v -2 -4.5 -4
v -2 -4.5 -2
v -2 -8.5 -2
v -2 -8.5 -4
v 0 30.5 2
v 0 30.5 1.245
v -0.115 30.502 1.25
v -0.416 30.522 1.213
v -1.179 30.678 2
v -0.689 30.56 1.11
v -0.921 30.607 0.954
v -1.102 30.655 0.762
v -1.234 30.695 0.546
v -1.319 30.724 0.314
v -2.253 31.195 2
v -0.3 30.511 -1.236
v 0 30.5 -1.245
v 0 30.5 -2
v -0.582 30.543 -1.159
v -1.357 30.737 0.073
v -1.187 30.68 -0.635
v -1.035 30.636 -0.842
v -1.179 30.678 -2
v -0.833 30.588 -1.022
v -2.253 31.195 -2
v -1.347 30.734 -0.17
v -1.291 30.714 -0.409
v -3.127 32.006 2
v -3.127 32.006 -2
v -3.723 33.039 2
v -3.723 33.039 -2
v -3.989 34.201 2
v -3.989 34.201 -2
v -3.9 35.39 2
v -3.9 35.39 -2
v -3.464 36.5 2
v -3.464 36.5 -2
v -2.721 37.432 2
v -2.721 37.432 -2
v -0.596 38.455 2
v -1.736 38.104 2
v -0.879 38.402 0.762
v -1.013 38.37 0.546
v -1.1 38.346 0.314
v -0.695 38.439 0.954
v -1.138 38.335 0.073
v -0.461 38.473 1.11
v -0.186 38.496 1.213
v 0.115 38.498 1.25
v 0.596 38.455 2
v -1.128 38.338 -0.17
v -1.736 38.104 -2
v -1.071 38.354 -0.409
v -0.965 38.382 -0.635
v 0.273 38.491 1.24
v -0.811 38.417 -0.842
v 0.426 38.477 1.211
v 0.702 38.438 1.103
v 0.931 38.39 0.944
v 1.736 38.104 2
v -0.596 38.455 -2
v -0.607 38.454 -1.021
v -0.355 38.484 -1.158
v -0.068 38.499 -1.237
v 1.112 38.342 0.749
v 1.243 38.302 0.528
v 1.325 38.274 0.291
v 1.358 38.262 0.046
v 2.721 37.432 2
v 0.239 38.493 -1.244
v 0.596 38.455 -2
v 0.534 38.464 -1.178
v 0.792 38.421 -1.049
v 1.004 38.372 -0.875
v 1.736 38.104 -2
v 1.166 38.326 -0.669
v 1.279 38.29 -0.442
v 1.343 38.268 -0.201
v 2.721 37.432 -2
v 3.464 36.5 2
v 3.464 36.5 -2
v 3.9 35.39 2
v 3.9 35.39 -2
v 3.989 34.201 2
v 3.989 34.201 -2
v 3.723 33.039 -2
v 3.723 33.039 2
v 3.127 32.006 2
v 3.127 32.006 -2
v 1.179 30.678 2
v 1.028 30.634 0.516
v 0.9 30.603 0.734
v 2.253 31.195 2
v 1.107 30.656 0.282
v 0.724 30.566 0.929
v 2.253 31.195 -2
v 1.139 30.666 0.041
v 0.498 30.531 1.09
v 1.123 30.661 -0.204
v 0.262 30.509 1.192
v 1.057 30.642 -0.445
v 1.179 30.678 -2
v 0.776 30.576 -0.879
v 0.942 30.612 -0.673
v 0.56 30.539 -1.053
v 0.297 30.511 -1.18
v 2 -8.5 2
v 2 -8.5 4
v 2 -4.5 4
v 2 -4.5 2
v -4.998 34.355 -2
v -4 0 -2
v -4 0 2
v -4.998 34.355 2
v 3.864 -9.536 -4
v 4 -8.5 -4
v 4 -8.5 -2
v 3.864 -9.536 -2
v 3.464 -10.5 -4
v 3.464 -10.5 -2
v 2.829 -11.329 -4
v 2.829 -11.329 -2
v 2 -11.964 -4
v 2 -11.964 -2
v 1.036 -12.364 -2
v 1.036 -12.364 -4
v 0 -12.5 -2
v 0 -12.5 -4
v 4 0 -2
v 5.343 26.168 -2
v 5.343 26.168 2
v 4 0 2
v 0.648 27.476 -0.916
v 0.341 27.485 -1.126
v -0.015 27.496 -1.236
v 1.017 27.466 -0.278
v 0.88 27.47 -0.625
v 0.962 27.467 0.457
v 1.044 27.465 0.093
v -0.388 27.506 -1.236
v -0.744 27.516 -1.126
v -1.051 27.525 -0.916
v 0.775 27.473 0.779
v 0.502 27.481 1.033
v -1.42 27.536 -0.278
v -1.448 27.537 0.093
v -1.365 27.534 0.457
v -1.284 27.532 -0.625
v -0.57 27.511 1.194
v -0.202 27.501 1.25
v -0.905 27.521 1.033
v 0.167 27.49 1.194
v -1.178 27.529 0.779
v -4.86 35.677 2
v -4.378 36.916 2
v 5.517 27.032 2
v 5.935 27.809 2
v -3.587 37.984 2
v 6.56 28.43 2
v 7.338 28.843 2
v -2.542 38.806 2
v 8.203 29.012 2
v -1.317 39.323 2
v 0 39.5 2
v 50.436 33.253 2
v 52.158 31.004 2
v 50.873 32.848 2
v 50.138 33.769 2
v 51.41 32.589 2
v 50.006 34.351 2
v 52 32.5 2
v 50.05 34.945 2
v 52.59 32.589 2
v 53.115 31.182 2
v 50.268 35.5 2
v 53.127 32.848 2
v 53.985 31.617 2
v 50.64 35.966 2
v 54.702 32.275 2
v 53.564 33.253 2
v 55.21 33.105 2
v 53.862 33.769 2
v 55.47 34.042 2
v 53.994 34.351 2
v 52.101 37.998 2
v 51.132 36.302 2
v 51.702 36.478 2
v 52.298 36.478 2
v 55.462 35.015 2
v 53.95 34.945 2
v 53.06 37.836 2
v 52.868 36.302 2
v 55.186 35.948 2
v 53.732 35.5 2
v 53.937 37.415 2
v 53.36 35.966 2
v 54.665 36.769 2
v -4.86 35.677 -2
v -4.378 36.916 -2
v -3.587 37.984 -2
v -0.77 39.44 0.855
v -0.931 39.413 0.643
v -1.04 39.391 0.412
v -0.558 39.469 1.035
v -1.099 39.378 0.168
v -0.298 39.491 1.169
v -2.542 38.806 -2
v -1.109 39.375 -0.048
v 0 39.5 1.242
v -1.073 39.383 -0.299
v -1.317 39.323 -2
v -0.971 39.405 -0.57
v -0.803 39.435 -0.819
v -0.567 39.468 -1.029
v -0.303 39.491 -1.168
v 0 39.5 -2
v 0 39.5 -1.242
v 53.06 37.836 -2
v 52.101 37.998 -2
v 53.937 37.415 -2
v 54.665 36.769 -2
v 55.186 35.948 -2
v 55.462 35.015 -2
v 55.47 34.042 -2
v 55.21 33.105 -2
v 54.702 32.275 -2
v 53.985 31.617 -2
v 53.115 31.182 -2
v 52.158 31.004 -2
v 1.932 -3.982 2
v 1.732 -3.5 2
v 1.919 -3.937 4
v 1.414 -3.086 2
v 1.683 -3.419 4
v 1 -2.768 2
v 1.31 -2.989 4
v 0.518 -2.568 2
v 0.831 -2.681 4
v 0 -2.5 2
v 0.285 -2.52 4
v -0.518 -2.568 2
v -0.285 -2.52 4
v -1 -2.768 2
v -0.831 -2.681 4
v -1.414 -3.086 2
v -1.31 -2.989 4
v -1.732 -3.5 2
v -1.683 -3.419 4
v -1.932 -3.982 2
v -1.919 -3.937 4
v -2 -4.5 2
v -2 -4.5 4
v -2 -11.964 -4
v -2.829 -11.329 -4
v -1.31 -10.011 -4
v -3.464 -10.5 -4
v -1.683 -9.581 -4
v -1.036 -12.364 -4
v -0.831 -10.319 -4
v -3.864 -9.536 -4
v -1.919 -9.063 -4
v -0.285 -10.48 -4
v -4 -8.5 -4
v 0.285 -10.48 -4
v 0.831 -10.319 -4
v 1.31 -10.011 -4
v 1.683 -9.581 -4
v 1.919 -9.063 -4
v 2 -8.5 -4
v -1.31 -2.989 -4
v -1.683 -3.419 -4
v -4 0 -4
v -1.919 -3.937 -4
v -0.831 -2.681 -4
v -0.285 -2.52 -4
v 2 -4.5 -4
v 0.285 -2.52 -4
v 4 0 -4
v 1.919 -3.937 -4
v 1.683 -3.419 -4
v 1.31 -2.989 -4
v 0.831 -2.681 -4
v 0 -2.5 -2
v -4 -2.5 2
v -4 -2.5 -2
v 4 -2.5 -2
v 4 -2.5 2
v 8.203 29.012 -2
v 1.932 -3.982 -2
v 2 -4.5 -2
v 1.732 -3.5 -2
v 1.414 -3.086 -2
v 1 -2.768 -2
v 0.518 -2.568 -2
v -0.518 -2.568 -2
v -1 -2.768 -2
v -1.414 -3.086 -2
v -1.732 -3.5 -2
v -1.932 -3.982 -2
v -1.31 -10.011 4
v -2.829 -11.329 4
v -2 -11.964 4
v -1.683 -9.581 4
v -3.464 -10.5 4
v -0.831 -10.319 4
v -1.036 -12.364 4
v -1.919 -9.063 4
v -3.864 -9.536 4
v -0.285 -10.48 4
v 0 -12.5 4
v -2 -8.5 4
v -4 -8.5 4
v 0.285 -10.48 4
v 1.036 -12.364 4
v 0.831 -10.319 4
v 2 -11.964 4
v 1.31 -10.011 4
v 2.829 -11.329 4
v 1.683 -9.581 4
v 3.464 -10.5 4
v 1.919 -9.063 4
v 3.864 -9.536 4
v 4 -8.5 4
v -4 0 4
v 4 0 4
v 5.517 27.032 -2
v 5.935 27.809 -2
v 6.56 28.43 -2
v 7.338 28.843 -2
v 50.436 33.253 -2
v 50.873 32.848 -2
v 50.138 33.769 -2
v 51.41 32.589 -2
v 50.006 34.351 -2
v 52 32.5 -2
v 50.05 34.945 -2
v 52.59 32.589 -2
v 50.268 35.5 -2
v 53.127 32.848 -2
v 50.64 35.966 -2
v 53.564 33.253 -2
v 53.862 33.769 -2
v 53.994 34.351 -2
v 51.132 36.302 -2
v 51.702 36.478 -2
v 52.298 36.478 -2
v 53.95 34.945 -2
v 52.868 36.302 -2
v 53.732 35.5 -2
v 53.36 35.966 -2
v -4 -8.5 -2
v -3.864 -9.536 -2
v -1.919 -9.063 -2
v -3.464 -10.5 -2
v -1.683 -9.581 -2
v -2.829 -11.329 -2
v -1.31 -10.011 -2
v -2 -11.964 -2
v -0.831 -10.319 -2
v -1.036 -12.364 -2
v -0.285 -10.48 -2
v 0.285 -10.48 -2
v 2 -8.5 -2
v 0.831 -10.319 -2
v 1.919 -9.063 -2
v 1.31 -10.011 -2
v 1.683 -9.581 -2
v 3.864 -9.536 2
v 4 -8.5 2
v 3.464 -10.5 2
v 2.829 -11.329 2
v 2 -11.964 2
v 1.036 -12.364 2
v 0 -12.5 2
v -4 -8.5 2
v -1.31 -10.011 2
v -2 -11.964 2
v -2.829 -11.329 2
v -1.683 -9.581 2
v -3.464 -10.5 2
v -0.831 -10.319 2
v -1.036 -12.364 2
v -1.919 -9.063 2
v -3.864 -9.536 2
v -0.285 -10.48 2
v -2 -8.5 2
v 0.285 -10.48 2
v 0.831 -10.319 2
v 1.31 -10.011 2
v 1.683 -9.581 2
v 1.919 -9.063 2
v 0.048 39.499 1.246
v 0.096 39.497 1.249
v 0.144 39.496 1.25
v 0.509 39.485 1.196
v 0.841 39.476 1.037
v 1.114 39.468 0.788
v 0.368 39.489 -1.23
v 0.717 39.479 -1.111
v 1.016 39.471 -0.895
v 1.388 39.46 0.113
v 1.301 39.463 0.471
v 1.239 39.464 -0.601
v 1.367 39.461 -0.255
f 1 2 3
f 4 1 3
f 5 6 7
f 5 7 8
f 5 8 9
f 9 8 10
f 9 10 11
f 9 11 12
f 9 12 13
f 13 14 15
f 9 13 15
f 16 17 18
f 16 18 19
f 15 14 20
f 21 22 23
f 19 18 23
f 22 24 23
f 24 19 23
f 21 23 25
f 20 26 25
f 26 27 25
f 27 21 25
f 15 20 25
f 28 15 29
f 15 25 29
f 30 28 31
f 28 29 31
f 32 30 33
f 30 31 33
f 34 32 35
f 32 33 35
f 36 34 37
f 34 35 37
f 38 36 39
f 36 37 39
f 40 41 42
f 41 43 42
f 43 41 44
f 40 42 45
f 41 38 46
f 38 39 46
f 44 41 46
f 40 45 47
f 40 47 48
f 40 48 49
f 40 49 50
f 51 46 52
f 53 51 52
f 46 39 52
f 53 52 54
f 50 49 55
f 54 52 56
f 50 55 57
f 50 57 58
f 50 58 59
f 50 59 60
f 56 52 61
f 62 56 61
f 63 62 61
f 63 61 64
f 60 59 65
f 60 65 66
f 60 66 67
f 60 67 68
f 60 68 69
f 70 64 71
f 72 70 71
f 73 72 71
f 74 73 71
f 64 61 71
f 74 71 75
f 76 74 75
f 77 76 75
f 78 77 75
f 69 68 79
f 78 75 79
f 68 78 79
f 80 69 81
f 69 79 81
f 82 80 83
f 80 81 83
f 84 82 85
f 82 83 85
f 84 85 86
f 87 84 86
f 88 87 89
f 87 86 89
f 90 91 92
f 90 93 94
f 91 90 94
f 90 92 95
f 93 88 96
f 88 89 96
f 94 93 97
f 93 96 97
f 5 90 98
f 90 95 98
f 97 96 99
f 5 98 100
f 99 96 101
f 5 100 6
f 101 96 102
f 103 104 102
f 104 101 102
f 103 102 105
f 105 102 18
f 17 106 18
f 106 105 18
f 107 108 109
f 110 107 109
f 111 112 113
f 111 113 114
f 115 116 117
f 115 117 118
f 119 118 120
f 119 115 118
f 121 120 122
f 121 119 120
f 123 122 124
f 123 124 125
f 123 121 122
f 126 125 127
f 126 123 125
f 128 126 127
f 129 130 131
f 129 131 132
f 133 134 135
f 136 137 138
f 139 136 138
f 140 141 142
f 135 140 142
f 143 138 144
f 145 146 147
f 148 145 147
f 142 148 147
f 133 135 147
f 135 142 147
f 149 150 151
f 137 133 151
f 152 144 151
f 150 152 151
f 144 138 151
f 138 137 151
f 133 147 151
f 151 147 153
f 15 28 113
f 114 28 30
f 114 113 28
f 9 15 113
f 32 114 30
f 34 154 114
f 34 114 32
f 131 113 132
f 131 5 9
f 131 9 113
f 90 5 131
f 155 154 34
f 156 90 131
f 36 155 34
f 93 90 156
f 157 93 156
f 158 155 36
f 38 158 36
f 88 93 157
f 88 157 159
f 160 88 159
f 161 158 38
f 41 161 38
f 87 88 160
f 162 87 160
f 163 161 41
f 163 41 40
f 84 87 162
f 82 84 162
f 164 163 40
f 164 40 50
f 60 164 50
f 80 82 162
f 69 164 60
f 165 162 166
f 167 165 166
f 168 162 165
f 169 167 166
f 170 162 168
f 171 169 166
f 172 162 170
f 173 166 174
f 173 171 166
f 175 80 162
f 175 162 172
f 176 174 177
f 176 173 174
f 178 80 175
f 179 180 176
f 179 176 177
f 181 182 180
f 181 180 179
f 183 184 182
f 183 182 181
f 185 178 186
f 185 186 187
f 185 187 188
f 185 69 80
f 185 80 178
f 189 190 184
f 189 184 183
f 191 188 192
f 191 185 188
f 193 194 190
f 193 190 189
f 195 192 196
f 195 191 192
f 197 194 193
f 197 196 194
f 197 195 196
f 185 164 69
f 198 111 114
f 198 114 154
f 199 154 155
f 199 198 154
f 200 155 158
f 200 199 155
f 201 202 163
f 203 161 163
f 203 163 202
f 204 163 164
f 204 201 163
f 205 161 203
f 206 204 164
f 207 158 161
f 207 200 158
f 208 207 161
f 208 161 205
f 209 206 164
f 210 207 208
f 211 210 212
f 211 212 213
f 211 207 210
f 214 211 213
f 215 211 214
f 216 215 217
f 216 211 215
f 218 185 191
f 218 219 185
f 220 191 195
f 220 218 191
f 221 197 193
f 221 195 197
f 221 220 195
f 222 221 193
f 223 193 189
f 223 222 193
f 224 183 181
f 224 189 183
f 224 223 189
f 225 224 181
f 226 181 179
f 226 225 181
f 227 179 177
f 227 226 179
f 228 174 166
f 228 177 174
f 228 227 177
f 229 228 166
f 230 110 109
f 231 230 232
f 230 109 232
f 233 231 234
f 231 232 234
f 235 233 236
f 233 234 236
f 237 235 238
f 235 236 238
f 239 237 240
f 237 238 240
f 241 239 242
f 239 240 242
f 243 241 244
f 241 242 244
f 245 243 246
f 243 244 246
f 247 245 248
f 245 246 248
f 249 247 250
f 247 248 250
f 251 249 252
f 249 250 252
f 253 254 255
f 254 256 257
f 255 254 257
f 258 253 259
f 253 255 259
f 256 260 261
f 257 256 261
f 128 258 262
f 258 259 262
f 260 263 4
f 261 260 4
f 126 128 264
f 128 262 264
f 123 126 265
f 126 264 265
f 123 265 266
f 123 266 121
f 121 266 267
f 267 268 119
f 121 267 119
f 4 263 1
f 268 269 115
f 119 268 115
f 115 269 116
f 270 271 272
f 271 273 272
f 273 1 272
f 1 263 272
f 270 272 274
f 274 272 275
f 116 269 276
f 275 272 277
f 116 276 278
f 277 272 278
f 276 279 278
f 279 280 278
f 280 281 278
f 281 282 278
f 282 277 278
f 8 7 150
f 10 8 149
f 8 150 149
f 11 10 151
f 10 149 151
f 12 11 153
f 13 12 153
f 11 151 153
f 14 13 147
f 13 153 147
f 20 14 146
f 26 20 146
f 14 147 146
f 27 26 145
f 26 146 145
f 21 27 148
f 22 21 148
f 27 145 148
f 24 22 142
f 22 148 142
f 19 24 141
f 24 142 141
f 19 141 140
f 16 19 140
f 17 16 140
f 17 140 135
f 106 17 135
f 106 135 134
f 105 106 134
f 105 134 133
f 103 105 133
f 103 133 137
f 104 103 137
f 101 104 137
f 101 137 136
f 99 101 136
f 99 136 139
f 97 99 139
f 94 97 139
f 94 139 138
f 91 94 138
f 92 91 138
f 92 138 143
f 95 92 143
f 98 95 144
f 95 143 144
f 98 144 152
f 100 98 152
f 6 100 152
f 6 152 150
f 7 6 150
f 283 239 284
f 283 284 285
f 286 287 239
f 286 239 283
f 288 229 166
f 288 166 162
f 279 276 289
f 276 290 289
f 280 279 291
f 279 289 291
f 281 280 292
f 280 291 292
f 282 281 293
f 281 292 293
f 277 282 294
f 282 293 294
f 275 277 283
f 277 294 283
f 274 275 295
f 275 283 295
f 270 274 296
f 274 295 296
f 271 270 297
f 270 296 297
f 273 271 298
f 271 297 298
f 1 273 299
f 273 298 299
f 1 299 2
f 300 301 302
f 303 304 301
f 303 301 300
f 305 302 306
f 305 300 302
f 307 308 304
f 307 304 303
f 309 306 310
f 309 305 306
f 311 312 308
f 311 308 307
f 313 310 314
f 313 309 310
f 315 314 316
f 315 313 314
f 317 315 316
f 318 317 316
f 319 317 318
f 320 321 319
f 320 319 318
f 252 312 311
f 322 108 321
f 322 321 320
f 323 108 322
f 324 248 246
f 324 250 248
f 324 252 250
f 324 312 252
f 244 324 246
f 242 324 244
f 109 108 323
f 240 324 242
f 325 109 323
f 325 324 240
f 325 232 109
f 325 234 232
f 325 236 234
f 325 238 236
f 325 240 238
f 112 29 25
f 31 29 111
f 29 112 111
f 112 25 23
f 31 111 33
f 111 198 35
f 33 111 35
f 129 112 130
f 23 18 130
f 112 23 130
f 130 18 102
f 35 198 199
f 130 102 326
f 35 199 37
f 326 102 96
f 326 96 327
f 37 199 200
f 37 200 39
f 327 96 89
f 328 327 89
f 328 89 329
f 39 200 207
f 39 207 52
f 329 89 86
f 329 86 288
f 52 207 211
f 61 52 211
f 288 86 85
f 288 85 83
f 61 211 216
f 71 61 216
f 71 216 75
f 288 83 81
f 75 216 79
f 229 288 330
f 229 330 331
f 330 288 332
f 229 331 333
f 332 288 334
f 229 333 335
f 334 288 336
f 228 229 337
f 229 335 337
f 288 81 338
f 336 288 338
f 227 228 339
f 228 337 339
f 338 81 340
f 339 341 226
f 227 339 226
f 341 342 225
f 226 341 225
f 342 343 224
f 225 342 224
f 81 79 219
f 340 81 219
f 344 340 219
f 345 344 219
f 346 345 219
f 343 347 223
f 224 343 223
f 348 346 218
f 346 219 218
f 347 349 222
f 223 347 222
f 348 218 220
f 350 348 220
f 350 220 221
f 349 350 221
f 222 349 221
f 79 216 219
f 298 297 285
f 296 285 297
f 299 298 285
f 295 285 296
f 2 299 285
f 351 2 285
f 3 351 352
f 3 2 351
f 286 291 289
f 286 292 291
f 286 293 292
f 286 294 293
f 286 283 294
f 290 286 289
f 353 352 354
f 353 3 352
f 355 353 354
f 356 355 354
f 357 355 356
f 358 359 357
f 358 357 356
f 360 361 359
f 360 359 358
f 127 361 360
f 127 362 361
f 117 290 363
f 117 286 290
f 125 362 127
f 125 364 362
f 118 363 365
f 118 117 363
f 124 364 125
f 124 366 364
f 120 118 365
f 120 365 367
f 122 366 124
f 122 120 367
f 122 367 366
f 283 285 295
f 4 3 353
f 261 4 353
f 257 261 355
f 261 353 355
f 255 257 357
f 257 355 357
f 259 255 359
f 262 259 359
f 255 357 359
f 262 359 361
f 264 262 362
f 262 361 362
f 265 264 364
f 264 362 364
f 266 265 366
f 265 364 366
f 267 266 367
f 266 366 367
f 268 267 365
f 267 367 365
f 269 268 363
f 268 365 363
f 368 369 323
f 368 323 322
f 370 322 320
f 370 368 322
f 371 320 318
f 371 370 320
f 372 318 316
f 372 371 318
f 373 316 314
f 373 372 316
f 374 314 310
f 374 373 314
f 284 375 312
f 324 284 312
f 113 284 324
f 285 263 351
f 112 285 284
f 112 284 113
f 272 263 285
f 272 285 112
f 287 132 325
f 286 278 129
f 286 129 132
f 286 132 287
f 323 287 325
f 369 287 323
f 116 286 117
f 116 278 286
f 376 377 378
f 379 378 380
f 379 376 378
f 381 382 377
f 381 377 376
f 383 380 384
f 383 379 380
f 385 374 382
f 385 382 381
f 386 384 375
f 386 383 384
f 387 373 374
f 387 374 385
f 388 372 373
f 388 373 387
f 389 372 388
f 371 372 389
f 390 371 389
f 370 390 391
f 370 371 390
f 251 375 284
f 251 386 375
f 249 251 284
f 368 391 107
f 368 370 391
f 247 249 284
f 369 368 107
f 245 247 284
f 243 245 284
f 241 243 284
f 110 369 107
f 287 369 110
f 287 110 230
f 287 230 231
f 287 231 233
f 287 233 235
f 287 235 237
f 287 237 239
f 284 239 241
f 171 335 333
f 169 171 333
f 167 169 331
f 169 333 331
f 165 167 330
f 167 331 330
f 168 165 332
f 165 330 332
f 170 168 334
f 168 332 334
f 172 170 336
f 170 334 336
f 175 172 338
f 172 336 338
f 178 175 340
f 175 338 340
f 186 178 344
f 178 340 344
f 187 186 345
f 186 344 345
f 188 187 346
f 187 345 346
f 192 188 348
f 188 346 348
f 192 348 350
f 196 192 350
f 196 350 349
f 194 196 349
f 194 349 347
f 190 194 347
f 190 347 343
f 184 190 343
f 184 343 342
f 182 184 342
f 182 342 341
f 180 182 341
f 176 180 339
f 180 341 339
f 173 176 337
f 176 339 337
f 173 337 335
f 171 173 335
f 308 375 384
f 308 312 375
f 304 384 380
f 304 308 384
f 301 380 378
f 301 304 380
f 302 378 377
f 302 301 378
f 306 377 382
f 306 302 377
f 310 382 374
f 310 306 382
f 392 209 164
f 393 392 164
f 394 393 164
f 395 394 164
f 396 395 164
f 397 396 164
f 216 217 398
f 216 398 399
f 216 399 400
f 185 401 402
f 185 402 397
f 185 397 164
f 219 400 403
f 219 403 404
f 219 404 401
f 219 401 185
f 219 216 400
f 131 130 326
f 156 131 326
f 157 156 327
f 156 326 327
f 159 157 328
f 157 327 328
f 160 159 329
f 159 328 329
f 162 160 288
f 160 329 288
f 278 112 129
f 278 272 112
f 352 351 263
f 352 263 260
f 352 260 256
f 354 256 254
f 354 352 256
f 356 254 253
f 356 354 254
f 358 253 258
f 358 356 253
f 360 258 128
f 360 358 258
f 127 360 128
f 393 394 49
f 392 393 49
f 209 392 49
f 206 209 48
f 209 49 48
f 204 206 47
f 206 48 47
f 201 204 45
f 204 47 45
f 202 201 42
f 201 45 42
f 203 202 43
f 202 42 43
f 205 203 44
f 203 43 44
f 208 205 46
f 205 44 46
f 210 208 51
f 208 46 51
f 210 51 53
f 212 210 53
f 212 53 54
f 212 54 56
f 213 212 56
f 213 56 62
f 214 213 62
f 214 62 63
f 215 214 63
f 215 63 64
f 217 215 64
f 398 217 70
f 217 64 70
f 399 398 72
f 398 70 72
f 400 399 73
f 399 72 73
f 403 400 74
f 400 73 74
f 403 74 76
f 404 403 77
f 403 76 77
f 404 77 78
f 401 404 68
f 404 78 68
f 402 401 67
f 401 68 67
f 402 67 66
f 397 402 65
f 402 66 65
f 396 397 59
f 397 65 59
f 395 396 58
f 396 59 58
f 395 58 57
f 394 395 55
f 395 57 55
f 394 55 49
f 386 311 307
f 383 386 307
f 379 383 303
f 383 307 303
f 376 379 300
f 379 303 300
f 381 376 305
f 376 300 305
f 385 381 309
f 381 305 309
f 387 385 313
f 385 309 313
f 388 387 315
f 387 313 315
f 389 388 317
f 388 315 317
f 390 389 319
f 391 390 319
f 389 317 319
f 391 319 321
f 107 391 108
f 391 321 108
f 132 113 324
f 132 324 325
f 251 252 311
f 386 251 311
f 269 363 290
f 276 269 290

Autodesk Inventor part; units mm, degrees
ref_plane "YZ Plane" through (0, 0, 0) normal (1, 0, 0) x (0, 1, 0)
ref_plane "XZ Plane" through (0, 0, 0) normal (0, 1, 0) x (-1, 0, 0)
sketch "Sketch2" plane through (0, 0, 0) normal (0, 0, 1) x (1, 0, 0)
  line L0 (-4, 0) -> (4, 0)
  line L1 (4, 0) -> (4, -12.5)
  line L2 (4, -12.5) -> (-4, -12.5)
  line L3 (-4, -12.5) -> (-4, 0)
  point P0 (0, 0)
  point P1 (0, 0)
  dimension "d8" = 12.5
  dimension "d9" = 8
extrude "Extrusion1" add sketch "Sketch2" along normal mid plane 8
fillet "Fillet1" radius 4 2 edges at (4, -12.5, 0) (-4, -12.5, 0)
sketch "Sketch4" plane through (0, 0, 4) normal (0, 0, 1) x (1, 0, 0)
  line L0 (0, -8.5) -> (0, -4.5) construction
  line L1 (2, -8.5) -> (2, -4.5)
  line L2 (-2, -4.5) -> (-2, -8.5)
  arc A0 (-2, -8.5) -> (2, -8.5) centre (0, -8.5) ccw
  arc A1 (2, -4.5) -> (-2, -4.5) centre (0, -4.5) ccw
  line L3 (4, 0) -> (-4, 0) projected
  point P0 (0, 0)
  point P1 (0, -6.5)
  point P2 (0, 0)
  dimension "d17" = 4
  dimension "d18" = 2
extrude "Extrusion3" cut sketch "Sketch4" against normal blind 10
sketch "Sketch5" plane through (4, 0, 4) normal (1, 0, 0) x (0, 0, -1)
  line L0 (0, -8.5) -> (0, -8.5) projected
  line L1 (0, -8.5) -> (8, -8.5) projected
  line L2 (8, -8.5) -> (8, -8.5) projected
  line L3 (8, -8.5) -> (0, -8.5) projected
  line L4 (8, -12.5) -> (0, -12.5) projected
  line L5 (2, -2.5) -> (6, -2.5)
  line L6 (6, -2.5) -> (6, -12.5)
  line L7 (6, -12.5) -> (2, -12.5)
  line L8 (2, -12.5) -> (2, -2.5)
  line L9 (0, -8.5) -> (0, 0) projected
  point P0 (4, 0)
  dimension "d22" = 4
  dimension "d23" = 10
  dimension "d24" = 2
extrude "Extrusion4" cut sketch "Sketch5" against normal up to surface (8 mm away)
ref_plane "Work Plane1" through (0, 0, 0) normal (0, 0, 1) x (1, 0, 0)
sketch "Sketch6" plane through (0, 0, 0) normal (0, 0, 1) x (1, 0, 0)
  line L0 (-4, 0) -> (4, 0) projected
  line L1 (-4, 0) -> (-4.9979, 34.3548)
  arc A0 (0, 39.5) -> (-4.9979, 34.3548) centre (0, 34.5) ccw
  line L2 (0, 39.5) -> (52.1008, 37.9985)
  arc A1 (52.1585, 31.0036) -> (52.1008, 37.9985) centre (52, 34.5) ccw
  line L3 (52.1585, 31.0036) -> (8.2033, 29.0116)
  line L4 (5.343, 26.1684) -> (4, 0)
  arc A2 (0, -2.5) -> (-2, -4.5) centre (0, -4.5) ccw projected
  arc A3 (2, -4.5) -> (0, -2.5) centre (0, -4.5) ccw projected
  arc A4 (8.2033, 29.0116) -> (5.343, 26.1684) centre (8.3391, 26.0147) ccw
  point P0 (0, 0)
  point P1 (0, 0)
  dimension "d28" = 5
  dimension "d29" = 39
  dimension "d30" = 52
  dimension "d31" = 3
  dimension "d32" = 3.5
extrude "Extrusion5" add sketch "Sketch6" along normal mid plane 4
sketch "Sketch7" plane through (0, 0, 2) normal (0, 0, 1) x (1, 0, 0)
  arc A0 (52.1585, 31.0036) -> (52.1008, 37.9985) centre (52, 34.5) ccw projected
  point P0 (0, 0)
hole "Hole1" at (52, 34.5, 2) direction (0, 0, -1) diameter 4 depth 4
sketch "Sketch8" plane through (0, 0, 2) normal (0, 0, 1) x (1, 0, 0)
  arc A0 (0, 39.5) -> (-4.9979, 34.3548) centre (0, 34.5) ccw projected
  point P0 (0, 0)
hole "Hole2" at (0, 34.5, 2) direction (0, 0, -1) diameter 8 depth 4
sketch "Sketch9" plane through (0, 39.5, 2) normal (0.0288, 0.9996, 0) x (0.9996, -0.0288, 0)
  line L0 (-4.8476, 0) -> (-4.8476, 4) projected
  line L1 (4.144, 0) -> (-3.856, 0) projected
  point P0 (1.1378, 2)
  point P1 (0.144, 2)
  point P2 (-4.8476, 2)
  point P3 (0.144, 0)
hole "Hole3" at (0.144, 39.4959, 0) direction (-0.0288, -0.9996, 0) diameter 2.5 depth 12
sketch "Sketch10" plane through (0, 0, -4) normal (0, 0, 1) x (1, 0, 0)
  circle A0 centre (0, -6.592) radius 2
  line L0 (4, 0) -> (-4, 0) projected
  line L1 (-2, -4.5) -> (-2, -8.5) projected
  arc A1 (-2, -8.5) -> (2, -8.5) centre (0, -8.5) ccw projected
  point P0 (0, 0)
  point P1 (0, 0)
  point P2 (-2, -6.5)
  point P3 (0, -10.5)
  dimension "d57" = 4
  dimension "d59" = 3.908
properties part number "10"
